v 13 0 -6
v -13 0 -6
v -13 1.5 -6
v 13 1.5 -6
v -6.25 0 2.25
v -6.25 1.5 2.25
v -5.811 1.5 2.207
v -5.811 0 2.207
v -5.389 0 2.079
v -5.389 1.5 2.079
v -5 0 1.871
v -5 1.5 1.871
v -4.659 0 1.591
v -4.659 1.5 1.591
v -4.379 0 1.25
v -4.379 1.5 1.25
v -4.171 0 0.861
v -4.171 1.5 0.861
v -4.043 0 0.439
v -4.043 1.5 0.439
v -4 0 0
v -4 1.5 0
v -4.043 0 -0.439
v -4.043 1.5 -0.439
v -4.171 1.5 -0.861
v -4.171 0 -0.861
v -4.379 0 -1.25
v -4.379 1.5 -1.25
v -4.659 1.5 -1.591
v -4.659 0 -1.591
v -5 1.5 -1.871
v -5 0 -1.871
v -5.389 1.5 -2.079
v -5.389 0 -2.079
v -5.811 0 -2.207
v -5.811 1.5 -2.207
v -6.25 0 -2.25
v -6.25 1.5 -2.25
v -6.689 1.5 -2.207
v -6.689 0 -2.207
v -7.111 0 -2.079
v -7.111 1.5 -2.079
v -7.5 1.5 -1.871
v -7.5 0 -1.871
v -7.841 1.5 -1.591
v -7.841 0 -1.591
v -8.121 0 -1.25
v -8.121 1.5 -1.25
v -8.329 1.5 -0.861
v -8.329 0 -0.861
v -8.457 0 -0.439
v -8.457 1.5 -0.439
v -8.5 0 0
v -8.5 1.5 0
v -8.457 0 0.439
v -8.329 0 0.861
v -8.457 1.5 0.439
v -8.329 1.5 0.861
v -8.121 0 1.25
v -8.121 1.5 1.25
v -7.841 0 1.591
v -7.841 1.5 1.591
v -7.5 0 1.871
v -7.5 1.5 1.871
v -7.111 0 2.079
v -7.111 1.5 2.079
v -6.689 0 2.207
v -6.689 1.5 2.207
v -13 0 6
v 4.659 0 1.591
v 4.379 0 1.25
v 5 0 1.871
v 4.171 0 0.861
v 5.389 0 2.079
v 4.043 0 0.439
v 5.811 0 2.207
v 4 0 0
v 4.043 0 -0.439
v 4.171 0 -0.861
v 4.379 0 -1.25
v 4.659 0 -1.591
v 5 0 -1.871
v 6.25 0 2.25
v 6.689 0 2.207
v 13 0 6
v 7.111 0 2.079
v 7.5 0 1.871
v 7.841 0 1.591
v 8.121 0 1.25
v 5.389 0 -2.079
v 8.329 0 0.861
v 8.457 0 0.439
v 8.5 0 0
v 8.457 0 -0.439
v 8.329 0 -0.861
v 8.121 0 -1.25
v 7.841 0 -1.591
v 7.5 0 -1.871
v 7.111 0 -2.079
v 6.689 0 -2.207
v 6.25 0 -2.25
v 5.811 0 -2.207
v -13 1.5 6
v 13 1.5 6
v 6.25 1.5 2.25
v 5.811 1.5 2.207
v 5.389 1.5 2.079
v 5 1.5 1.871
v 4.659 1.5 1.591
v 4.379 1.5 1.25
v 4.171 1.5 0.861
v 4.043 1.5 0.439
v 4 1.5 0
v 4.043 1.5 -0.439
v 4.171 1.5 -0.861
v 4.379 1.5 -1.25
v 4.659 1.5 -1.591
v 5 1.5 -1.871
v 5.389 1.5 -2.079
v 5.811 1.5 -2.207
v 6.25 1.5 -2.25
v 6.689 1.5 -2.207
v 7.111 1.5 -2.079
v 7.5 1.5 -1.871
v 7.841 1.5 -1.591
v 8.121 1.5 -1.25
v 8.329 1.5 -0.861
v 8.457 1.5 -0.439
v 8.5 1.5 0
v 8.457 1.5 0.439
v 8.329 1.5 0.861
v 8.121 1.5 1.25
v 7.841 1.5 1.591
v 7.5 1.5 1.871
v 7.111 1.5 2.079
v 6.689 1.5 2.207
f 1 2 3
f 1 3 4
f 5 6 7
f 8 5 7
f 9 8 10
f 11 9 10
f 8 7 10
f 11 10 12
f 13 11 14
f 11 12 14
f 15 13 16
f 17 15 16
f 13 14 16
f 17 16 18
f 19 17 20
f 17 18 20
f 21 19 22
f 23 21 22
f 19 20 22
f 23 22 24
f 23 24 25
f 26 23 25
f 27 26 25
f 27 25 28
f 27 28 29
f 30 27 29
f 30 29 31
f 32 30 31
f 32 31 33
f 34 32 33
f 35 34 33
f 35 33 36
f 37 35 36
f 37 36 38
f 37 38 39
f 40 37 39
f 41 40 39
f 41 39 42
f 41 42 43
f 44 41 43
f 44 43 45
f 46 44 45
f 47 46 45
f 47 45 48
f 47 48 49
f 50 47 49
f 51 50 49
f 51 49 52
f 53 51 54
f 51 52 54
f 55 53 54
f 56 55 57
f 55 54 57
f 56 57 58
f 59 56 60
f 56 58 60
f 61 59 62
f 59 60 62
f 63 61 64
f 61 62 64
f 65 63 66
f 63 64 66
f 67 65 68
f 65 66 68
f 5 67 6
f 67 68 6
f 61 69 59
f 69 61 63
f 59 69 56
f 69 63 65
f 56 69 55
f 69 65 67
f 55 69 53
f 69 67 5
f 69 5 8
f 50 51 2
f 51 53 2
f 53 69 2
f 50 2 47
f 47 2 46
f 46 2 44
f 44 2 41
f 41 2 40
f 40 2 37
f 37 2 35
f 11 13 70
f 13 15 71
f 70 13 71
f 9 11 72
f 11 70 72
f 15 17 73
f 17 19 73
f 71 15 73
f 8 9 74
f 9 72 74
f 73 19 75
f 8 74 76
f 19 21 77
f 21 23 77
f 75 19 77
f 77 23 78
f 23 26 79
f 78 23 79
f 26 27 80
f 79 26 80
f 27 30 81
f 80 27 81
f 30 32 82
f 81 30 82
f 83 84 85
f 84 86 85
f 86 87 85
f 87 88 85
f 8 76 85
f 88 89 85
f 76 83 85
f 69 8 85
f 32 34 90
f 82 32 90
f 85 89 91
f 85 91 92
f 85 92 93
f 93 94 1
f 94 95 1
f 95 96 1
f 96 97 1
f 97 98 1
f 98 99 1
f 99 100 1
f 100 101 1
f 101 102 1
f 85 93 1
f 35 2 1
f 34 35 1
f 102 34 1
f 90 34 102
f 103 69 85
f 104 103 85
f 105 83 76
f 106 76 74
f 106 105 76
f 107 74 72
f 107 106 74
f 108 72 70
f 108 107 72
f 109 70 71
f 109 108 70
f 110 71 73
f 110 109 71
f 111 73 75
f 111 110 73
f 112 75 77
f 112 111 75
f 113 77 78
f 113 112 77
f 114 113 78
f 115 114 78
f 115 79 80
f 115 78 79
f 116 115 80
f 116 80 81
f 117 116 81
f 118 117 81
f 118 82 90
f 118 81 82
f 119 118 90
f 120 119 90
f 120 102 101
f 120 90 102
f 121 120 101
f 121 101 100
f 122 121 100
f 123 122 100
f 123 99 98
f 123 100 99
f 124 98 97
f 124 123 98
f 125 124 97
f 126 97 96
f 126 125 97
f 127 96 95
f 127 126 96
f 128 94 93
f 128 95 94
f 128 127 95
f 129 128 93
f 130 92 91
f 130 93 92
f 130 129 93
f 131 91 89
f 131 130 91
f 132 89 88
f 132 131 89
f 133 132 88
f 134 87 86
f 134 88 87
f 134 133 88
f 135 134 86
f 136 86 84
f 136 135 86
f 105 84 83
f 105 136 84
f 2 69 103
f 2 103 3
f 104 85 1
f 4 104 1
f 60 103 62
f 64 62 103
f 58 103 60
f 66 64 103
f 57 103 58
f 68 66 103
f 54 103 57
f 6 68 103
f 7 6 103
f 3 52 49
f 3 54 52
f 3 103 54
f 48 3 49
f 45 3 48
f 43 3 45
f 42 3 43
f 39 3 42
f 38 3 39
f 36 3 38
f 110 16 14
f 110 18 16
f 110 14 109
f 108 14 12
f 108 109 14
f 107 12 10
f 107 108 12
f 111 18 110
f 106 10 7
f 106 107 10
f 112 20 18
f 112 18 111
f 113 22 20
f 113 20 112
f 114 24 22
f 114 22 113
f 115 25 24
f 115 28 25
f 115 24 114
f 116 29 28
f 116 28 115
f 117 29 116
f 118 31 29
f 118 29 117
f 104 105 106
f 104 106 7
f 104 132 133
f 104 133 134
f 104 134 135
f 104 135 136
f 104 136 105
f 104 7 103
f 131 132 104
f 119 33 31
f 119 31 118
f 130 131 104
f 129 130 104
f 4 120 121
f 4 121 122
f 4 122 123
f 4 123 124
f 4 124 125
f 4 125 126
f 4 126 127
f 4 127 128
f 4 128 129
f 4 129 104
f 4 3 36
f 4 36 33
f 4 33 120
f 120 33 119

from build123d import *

# Parameters (mm, degrees)
SKETCH1_W           = 26
SKETCH1_H           = 12
BOSS_EXTRUDE1_DEPTH = 1.5
SKETCH2_R           = 2.25
CUT_EXTRUDE1_DEPTH  = 2.5


with BuildPart() as part:
    # Sketch1 → Boss-Extrude1 (new body)
    with BuildSketch(Plane(origin=(0, 0, 0), x_dir=(1, 0, 0), z_dir=(0, 1, 0))):
        Rectangle(SKETCH1_W, SKETCH1_H)
    extrude(amount=BOSS_EXTRUDE1_DEPTH)

    # Sketch2 → Cut-Extrude1 (cut, through all)
    with BuildSketch(Plane(origin=(0, 1.5, 0), x_dir=(1, 0, 0), z_dir=(0, 1, 0))):
        with Locations(Location((-6.25, 0, 0), (0, 0, 270))):  # turned: the seam where the file's is
            Circle(SKETCH2_R)
    cut_extrude1 = extrude(amount=-CUT_EXTRUDE1_DEPTH, mode=Mode.SUBTRACT)

    # Mirror1: Cut-Extrude1 across plane
    add(cut_extrude1.mirror(Plane(origin=(0, 0, 0), x_dir=(0, 0, 1), z_dir=(1, 0, 0))), mode=Mode.SUBTRACT)


solid = part.part
